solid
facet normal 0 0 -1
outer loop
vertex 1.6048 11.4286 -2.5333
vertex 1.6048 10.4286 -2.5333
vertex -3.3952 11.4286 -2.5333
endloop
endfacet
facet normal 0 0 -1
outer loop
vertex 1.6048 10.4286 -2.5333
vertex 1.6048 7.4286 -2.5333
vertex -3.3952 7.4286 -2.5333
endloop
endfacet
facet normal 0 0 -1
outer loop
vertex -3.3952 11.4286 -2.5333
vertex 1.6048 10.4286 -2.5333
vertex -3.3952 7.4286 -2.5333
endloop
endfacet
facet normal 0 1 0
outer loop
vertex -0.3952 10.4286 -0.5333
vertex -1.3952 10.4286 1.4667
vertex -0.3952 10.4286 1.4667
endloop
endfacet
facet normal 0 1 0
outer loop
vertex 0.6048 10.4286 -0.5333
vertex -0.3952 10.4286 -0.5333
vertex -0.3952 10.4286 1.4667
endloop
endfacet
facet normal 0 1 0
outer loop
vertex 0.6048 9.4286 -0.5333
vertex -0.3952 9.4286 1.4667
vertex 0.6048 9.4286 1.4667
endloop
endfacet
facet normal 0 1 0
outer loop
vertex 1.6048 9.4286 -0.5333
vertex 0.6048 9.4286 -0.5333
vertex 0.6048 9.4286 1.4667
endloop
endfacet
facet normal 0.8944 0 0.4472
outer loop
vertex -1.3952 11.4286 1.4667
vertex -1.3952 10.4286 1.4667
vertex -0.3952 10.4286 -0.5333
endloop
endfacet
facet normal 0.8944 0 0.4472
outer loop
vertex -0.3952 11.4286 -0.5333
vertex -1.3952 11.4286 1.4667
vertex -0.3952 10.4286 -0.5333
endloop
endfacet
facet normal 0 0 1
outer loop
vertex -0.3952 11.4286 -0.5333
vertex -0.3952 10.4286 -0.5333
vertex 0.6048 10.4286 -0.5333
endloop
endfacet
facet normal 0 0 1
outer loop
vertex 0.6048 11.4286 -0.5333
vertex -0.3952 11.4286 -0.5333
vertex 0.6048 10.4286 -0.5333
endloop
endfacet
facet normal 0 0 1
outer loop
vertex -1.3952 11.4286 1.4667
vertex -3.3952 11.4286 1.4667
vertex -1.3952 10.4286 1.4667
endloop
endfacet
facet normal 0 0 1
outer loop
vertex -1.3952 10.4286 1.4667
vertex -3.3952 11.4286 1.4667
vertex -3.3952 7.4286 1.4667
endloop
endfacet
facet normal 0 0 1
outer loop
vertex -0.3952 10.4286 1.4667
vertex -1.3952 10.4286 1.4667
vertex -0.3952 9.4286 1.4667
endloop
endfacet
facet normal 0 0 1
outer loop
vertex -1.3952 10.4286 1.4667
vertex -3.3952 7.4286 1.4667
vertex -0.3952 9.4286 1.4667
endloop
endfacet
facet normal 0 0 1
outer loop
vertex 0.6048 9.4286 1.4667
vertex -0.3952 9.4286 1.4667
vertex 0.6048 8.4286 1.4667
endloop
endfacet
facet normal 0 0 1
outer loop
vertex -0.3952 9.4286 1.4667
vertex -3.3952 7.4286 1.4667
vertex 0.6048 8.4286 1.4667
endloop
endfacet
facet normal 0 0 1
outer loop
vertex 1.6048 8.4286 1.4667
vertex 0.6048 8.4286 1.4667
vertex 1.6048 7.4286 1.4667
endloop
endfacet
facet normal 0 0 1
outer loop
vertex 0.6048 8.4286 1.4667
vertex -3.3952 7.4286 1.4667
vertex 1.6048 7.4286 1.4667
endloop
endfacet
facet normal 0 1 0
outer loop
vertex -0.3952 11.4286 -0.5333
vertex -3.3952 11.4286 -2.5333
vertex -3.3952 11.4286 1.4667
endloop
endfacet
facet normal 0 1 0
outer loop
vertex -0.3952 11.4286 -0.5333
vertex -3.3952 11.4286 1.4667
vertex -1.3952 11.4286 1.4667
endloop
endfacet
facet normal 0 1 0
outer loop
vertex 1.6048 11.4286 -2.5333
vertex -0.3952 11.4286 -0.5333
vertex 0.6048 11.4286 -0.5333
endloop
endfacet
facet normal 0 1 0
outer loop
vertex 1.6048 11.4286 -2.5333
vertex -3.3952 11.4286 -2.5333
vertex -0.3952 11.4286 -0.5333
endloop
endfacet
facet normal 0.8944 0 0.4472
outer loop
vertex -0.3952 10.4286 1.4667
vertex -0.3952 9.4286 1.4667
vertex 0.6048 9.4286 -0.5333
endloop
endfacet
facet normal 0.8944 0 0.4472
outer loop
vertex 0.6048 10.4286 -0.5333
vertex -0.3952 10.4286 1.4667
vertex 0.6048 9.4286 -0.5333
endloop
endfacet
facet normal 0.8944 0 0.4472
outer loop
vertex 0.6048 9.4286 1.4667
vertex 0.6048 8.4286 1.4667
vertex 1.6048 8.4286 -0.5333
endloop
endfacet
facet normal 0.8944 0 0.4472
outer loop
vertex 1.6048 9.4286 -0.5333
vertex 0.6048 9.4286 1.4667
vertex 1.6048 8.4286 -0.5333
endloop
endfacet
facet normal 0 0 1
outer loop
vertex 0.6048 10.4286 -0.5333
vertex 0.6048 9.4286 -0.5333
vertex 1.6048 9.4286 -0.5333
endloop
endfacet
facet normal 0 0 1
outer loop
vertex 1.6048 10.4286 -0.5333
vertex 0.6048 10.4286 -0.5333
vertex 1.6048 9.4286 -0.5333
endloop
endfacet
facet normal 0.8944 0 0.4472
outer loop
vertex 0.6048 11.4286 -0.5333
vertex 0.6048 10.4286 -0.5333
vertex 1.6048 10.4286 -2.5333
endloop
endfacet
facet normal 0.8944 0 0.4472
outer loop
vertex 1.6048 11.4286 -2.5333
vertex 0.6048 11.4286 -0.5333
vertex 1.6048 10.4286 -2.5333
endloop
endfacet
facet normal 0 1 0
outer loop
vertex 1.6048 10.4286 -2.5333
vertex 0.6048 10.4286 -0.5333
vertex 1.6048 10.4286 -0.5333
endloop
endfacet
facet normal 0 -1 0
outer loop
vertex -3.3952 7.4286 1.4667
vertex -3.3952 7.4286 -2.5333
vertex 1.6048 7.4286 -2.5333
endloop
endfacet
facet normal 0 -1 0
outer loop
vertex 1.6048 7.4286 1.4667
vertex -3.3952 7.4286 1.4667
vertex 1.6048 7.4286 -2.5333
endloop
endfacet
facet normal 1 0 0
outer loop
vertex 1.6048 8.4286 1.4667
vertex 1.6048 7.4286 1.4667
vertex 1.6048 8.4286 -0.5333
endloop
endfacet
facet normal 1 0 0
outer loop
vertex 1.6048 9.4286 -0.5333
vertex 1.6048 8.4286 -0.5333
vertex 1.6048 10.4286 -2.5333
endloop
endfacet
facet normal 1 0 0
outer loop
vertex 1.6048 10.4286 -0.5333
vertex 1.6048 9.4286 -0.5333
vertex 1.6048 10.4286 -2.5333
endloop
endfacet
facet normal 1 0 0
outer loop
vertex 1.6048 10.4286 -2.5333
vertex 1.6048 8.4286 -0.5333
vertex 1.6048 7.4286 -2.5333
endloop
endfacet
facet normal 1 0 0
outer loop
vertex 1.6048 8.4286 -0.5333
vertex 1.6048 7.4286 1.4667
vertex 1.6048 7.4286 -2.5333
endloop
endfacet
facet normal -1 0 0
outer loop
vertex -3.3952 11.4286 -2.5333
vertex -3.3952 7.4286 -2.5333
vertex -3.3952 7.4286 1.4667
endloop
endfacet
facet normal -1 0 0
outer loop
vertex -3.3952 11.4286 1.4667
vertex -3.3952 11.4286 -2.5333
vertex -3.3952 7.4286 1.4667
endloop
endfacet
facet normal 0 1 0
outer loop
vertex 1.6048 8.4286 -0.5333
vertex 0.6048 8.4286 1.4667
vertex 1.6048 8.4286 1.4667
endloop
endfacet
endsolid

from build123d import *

# Parameters (mm, degrees)
SKETCH_1_W      = 25
SKETCH_1_H      = 20
EXTRUDE_1_DEPTH = 5
EXTRUDE_2_DEPTH = 10
EXTRUDE_4_DEPTH = 20
EXTRUDE_5_DEPTH = 15
SCALE_1_SCALE   = 0.2


with BuildPart() as part:
    # 草圖1 → 填料-伸長1 (new body)
    with BuildSketch(Plane(origin=(0, 0, 0), x_dir=(1, 0, 0), z_dir=(0, 1, 0))):
        Rectangle(SKETCH_1_W, SKETCH_1_H)
    extrude(amount=EXTRUDE_1_DEPTH)

    # 草圖1<3> → 填料-伸長2 (add)
    with BuildSketch(Plane(origin=(0, 0, 0), x_dir=(1, 0, 0), z_dir=(0, 1, 0))):
        Polygon((7.5, -10), (12.5, 0), (12.5, 10), (-12.5, 10), (-12.5, -10), align=None)
    extrude(amount=EXTRUDE_2_DEPTH)

    # 草圖1<5> → 填料-伸長4 (add)
    with BuildSketch(Plane(origin=(0, 0, 0), x_dir=(1, 0, 0), z_dir=(0, 1, 0))):
        Polygon((-2.5, -10), (2.5, 0), (7.5, 0), (12.5, 10), (-12.5, 10), (-12.5, -10), align=None)
    extrude(amount=EXTRUDE_4_DEPTH)

    # 草圖1<6> → 填料-伸長5 (add)
    with BuildSketch(Plane(origin=(0, 0, 0), x_dir=(1, 0, 0), z_dir=(0, 1, 0))):
        Polygon((7.5, 0), (2.5, 0), (-2.5, -10), (2.5, -10), align=None)
        Polygon((12.5, 10), (7.5, 0), (12.5, 0), align=None)
    extrude(amount=EXTRUDE_5_DEPTH)


with BuildPart() as part_1:
    # 縮放比例1: scaled about (-1.119047619, 9.285714286, -0.666666667)
    add(part.part.scale(SCALE_1_SCALE).moved(Location((-0.895238095, 7.428571429, -0.533333334))))


solid = part_1.part
